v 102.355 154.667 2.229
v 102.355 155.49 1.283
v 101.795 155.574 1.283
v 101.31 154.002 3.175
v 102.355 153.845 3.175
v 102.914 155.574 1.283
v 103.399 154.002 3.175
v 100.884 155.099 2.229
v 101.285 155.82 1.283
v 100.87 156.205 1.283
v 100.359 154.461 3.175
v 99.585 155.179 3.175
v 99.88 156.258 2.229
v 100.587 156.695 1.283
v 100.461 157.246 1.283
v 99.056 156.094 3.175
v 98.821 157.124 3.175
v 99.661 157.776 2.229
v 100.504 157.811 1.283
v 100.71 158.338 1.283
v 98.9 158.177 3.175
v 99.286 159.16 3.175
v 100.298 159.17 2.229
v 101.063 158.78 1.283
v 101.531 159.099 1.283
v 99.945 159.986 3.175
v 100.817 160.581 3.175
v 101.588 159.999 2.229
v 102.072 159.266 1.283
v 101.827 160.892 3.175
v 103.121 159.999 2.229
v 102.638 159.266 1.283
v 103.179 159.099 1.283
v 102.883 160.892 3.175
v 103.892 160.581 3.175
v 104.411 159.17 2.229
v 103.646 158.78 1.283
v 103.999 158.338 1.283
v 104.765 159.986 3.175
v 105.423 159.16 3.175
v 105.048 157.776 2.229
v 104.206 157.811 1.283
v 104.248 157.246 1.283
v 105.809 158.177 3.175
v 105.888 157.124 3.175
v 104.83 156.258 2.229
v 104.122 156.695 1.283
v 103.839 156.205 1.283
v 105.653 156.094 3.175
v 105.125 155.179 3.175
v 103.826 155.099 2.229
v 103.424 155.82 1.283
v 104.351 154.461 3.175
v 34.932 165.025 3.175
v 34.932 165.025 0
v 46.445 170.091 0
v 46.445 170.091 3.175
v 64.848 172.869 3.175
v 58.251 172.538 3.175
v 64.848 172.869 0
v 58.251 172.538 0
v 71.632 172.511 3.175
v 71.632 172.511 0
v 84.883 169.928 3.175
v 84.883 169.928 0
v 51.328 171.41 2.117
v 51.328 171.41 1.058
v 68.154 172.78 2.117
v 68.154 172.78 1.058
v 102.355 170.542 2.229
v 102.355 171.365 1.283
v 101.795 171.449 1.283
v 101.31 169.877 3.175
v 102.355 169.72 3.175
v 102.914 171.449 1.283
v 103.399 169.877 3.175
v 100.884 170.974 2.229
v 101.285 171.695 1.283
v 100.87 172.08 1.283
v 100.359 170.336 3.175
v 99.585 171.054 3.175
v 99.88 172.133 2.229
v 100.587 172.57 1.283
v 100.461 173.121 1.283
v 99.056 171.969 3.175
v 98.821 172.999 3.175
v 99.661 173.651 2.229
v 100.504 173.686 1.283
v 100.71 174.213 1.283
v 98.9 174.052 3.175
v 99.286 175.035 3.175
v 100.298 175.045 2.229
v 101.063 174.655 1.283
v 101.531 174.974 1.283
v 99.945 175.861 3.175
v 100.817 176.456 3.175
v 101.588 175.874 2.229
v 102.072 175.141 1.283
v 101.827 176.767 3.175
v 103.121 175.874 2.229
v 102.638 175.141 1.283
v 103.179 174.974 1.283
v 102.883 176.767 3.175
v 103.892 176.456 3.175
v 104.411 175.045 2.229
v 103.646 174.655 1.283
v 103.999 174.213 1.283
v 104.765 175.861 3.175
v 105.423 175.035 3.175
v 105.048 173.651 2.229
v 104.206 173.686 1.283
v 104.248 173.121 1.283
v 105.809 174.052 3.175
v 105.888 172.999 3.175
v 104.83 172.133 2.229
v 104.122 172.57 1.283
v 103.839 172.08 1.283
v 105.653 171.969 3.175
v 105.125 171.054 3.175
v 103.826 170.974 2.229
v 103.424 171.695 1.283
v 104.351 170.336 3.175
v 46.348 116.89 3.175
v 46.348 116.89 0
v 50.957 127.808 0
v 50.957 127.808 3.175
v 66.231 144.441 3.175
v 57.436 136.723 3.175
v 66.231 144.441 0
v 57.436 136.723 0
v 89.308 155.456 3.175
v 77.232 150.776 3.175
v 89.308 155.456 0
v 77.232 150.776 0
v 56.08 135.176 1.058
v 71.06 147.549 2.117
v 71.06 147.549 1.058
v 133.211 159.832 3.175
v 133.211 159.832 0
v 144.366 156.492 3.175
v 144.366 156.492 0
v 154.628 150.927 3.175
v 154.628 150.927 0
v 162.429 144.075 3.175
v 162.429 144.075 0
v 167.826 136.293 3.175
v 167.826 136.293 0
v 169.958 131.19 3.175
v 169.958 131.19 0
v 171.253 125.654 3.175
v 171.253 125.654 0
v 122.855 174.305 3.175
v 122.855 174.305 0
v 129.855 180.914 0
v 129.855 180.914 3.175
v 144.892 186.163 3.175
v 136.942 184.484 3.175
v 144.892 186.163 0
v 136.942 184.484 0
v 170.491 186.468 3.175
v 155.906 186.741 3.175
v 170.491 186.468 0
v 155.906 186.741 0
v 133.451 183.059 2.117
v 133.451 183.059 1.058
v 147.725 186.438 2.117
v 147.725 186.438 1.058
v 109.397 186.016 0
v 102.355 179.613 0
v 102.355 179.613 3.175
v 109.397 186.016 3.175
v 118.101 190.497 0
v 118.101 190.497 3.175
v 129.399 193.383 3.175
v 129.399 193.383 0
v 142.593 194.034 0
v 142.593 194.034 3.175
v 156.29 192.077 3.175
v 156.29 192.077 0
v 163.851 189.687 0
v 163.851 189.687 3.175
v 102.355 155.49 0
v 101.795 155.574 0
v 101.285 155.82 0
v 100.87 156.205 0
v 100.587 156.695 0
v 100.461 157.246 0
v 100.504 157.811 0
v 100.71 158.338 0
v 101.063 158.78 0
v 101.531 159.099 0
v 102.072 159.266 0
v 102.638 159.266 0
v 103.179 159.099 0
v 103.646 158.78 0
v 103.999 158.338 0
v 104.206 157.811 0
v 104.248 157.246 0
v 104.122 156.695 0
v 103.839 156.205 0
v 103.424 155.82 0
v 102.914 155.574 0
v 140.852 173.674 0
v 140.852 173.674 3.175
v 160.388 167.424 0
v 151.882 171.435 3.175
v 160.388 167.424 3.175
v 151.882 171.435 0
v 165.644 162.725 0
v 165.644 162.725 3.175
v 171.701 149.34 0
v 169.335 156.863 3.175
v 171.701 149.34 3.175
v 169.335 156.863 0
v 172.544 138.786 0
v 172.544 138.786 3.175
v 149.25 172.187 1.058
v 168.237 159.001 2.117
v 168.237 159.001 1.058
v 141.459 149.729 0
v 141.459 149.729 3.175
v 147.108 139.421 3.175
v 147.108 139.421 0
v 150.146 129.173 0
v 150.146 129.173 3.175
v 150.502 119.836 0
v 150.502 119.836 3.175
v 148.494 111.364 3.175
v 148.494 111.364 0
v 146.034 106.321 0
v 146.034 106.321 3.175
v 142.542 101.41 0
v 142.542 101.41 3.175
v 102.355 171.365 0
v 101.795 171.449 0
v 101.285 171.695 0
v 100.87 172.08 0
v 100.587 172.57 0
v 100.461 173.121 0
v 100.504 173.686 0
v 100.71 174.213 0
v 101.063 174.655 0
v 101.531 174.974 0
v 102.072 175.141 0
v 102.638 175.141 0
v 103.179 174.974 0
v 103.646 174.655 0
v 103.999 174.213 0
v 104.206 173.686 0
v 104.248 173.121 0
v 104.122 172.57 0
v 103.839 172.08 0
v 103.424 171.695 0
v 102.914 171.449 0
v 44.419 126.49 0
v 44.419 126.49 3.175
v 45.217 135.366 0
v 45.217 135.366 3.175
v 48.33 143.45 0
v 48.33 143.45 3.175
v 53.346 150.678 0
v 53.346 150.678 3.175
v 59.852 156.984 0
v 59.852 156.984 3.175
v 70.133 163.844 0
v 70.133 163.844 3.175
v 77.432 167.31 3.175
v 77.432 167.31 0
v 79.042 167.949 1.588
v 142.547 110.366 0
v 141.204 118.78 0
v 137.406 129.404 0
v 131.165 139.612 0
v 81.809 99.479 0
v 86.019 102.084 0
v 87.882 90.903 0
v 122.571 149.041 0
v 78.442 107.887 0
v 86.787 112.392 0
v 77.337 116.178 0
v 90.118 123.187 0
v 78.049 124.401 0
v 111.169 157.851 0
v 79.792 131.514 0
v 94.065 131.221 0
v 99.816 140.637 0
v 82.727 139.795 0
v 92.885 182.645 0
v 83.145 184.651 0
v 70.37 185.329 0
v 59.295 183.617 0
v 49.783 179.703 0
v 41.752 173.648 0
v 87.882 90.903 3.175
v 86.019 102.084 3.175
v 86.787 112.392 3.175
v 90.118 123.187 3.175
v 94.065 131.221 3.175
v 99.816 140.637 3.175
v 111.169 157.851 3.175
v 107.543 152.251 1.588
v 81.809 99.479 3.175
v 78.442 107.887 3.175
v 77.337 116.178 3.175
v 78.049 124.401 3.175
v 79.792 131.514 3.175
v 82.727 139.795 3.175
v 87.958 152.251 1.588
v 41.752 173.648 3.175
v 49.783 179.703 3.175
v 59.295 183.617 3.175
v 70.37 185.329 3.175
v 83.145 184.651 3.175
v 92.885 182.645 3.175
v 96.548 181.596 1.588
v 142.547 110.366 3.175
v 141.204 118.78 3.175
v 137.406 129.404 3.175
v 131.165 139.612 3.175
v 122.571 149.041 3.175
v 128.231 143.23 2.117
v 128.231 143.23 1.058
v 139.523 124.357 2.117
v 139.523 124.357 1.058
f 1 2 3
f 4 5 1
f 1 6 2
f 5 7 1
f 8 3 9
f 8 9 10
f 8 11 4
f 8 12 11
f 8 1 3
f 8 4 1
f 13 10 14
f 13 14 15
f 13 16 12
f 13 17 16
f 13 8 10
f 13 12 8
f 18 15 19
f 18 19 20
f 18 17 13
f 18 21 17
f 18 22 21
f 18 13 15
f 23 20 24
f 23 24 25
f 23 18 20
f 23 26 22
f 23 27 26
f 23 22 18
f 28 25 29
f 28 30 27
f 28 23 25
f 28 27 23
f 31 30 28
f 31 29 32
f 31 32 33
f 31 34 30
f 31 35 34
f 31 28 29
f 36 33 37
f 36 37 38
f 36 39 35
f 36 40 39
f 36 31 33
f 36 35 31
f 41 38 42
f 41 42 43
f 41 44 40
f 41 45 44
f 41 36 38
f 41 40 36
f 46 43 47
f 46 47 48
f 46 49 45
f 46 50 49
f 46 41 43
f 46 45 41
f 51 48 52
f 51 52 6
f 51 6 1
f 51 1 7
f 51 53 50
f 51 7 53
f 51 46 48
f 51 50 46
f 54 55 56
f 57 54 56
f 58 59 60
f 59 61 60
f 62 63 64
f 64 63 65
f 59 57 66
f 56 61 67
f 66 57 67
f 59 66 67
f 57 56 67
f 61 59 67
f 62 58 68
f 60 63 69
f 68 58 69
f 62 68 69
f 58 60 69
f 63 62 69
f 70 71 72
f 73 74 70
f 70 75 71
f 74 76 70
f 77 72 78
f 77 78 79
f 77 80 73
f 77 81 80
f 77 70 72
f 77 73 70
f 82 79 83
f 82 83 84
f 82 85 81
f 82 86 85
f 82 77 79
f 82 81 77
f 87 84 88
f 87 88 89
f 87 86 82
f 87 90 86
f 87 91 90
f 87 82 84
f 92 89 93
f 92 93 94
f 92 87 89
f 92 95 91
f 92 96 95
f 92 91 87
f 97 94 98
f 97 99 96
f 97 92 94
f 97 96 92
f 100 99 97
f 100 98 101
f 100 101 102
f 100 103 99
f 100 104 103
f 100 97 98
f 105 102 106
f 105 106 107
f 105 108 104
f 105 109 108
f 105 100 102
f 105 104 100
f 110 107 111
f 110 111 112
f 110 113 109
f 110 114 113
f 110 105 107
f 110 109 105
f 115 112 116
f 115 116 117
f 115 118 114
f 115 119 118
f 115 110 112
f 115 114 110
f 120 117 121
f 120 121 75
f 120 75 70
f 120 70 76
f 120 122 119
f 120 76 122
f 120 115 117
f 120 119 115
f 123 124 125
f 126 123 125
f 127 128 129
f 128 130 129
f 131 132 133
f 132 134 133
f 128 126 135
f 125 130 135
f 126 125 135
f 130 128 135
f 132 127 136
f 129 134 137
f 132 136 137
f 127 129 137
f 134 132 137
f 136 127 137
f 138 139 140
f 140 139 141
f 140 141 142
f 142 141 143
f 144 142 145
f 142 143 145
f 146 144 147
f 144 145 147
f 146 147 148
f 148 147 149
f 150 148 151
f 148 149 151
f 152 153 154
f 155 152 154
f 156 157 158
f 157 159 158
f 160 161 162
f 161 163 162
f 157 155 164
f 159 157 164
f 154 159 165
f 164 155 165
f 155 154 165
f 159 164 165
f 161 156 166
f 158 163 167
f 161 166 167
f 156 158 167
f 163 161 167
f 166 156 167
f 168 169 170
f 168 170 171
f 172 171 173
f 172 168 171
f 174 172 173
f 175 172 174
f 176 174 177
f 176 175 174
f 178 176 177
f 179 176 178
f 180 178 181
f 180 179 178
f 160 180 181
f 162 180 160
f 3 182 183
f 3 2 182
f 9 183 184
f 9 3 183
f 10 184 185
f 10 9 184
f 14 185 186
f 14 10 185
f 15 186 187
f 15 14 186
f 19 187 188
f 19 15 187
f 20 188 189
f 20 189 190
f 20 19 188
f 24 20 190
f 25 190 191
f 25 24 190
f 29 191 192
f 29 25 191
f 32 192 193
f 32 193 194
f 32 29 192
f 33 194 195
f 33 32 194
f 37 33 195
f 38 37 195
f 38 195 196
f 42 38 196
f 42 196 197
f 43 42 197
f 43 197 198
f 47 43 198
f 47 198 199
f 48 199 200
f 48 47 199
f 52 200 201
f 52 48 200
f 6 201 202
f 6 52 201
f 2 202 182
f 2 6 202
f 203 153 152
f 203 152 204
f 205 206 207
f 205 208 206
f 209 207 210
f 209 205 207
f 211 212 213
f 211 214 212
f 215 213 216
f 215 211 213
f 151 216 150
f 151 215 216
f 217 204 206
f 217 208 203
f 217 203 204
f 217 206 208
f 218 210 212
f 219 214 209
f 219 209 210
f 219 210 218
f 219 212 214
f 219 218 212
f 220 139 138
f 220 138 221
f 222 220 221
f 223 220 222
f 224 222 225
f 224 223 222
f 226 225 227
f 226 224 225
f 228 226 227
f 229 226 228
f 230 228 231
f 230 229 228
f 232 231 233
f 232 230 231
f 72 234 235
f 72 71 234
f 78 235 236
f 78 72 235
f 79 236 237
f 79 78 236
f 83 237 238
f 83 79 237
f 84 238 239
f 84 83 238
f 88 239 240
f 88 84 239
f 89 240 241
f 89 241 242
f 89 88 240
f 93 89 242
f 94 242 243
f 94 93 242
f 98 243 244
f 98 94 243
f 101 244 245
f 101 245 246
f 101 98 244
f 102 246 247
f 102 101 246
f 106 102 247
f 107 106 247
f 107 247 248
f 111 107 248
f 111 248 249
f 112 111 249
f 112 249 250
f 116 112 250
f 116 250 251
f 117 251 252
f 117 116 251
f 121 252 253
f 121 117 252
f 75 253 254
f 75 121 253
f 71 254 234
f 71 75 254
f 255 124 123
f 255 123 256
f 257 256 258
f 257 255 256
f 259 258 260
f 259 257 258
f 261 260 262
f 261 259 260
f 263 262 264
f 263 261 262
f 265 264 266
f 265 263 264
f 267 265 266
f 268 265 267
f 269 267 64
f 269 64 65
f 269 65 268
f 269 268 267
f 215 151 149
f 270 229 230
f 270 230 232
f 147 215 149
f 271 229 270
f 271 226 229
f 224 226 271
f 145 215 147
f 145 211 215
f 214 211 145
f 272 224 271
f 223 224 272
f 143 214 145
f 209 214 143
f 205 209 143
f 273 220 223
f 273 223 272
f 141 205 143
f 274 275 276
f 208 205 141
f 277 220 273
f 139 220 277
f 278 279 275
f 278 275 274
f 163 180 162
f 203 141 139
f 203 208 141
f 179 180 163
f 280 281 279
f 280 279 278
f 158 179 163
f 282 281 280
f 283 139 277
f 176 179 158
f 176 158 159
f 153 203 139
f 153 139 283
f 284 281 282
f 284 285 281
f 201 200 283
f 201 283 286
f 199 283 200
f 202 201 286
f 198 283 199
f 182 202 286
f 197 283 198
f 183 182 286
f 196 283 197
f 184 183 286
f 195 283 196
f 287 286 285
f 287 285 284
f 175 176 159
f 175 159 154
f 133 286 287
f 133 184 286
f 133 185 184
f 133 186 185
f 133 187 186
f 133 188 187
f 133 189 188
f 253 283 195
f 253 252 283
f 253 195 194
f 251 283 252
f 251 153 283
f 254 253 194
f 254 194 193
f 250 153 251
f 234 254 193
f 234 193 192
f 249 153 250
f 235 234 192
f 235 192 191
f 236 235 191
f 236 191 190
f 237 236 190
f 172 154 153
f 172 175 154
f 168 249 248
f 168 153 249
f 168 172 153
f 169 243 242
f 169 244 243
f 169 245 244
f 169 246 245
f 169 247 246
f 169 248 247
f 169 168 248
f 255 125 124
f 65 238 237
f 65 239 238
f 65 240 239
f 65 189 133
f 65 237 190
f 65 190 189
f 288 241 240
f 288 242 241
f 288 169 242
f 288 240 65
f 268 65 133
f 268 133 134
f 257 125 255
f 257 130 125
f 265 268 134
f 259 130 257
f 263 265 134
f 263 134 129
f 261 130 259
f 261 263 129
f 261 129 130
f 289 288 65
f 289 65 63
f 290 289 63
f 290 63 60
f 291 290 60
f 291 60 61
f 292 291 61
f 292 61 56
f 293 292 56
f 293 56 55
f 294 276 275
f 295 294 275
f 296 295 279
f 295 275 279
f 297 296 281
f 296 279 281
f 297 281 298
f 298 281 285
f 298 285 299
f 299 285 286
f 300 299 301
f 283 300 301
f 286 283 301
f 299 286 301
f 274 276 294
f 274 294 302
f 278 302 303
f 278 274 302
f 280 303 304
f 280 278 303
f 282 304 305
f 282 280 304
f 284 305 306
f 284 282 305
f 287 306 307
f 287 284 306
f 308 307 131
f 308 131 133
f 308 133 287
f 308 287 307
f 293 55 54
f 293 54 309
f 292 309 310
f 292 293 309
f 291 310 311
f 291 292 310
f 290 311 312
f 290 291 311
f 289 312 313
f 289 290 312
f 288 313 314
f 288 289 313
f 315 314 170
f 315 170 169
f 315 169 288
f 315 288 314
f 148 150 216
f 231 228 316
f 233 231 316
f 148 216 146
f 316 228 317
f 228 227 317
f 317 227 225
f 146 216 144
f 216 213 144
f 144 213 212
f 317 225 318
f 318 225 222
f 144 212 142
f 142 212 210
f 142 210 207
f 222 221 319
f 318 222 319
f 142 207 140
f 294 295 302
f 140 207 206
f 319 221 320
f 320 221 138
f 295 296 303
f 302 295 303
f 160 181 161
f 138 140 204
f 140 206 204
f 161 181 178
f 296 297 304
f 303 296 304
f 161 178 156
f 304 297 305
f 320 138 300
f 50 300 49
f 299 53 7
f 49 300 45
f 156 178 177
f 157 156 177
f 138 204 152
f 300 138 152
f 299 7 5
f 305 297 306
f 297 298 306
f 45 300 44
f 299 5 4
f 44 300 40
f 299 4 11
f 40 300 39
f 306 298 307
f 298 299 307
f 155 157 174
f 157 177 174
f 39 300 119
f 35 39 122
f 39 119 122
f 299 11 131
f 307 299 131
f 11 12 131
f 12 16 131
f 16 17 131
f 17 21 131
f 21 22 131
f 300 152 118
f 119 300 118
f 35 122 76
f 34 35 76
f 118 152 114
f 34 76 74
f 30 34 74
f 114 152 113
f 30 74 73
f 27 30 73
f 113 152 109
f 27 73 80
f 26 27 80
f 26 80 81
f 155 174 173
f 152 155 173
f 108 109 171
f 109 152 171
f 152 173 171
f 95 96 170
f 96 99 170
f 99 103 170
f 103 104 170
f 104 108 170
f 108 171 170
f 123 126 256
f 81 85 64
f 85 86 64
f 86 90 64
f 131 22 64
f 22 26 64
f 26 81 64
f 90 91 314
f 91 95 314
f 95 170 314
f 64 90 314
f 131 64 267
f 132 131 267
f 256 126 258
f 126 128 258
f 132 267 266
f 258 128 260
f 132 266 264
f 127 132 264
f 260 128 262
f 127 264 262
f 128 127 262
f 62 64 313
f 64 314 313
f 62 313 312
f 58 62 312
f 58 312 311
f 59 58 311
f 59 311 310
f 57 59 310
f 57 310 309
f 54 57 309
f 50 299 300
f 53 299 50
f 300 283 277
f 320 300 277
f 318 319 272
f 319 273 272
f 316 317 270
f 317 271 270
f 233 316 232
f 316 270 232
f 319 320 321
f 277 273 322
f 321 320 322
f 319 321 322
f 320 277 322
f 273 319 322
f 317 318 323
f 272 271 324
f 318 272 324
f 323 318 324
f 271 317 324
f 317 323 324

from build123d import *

# Parameters (mm, degrees)
BOSS_EXTRUDE1_DEPTH                           = 3.175
CSK_FOR_6_FLAT_HEAD_MACHINE_SCREW1_AT_2_COUNT = 2
CSK_FOR_6_FLAT_HEAD_MACHINE_SCREW1_AT_2_PITCH = 15.875


with BuildPart() as part:
    # Sketch1 → Boss-Extrude1 (new body)
    with BuildSketch(Plane.XY):
        with BuildLine():
            add(Edge.make_bspline(
                [(34.931884294, 165.025383652), (48.828055098, 187.719675837), (76.45444521, 188.520066825), (100.445839981, 180.332984416), (102.354778378, 179.613312562)],
                knots=[0, 0, 0, 0, 0.389677888, 0.423902211, 0.423902211, 0.423902211, 0.423902211], degree=3))
            add(Edge.make_bspline(
                [(102.354778378, 179.613312562), (103.688252769, 181.188793447), (120.08516999, 197.822043176), (153.725104458, 196.423627733), (170.491254722, 186.467930029)],
                knots=[0.566670892, 0.566670892, 0.566670892, 0.566670892, 0.604773786, 1, 1, 1, 1], degree=3))
            add(Edge.make_bspline(
                [(122.854505464, 174.304585318), (133.217704907, 186.42088718), (141.87402844, 187.437840711), (170.491254722, 186.467930029)],
                knots=[0.652055608, 0.652055608, 0.652055608, 0.652055608, 1, 1, 1, 1], degree=3))
            add(Edge.make_bspline(
                [(122.854505464, 174.304585318), (150.100917529, 174.691970084), (179.076532886, 172.111025689), (171.253334777, 125.653941669)],
                knots=[0.582619189, 0.582619189, 0.582619189, 0.582619189, 1, 1, 1, 1], degree=3))
            add(Edge.make_bspline(
                [(133.211242061, 159.831846766), (133.979472702, 159.682774194), (151.701954736, 155.882016517), (168.618692728, 143.562281616), (171.253334777, 125.653941669)],
                knots=[0.658818977, 0.658818977, 0.658818977, 0.658818977, 0.673582965, 1, 1, 1, 1], degree=3))
            add(Edge.make_bspline(
                [(133.211242061, 159.831846766), (135.171104002, 157.821803299), (149.411618041, 141.491919338), (156.677266996, 118.334043551), (142.542206677, 101.410441691)],
                knots=[0.632989669, 0.632989669, 0.632989669, 0.632989669, 0.680758972, 1, 1, 1, 1], degree=3))
            add(Edge.make_bspline(
                [(111.168977908, 157.851131594), (130.281346763, 145.416554664), (144.493361512, 126.332685465), (142.542206677, 101.410441691)],
                knots=[0.543056126, 0.543056126, 0.543056126, 0.543056126, 1, 1, 1, 1], degree=3))
            add(Edge.make_bspline(
                [(87.881776799, 90.903091177), (80.744106998, 115.729737526), (96.501549834, 135.001149116), (109.967437477, 155.985823694), (111.168977908, 157.851131594)],
                knots=[0, 0, 0, 0, 0.464688532, 0.510268863, 0.510268863, 0.510268863, 0.510268863], degree=3))
            add(Edge.make_bspline(
                [(87.881776799, 90.903091177), (69.284973328, 112.208882094), (79.686924952, 132.536670793), (88.858930138, 154.386086423), (89.308499289, 155.455602419)],
                knots=[0, 0, 0, 0, 0.384997093, 0.404814032, 0.404814032, 0.404814032, 0.404814032], degree=3))
            add(Edge.make_bspline(
                [(46.348413822, 116.89002104), (52.796354346, 138.61615839), (70.085133937, 149.298268287), (89.308499289, 155.455602419)],
                knots=[0, 0, 0, 0, 0.378547614, 0.378547614, 0.378547614, 0.378547614], degree=3))
            add(Edge.make_bspline(
                [(46.348413822, 116.89002104), (37.891933448, 141.39657653), (59.918576266, 161.597817566), (82.928148168, 169.350328204), (84.88315803, 169.928160001)],
                knots=[0, 0, 0, 0, 0.348685432, 0.380913319, 0.380913319, 0.380913319, 0.380913319], degree=3))
            add(Edge.make_bspline(
                [(34.931884294, 165.025383652), (50.935408962, 174.180938827), (68.379973418, 174.627254849), (84.88315803, 169.928160001)],
                knots=[0, 0, 0, 0, 0.348652947, 0.348652947, 0.348652947, 0.348652947], degree=3))
        make_face()
    extrude(amount=BOSS_EXTRUDE1_DEPTH)

    # Sketch3 → CSK for #6 Flat Head Machine Screw1 (revolve, cut)
    with BuildSketch(Plane(origin=(102.354778378, 173.263312562, 3.175), x_dir=(0, -1, 0), z_dir=(1, 0, 0))):
        Polygon((0, 0), (0, 3.175), (1.89865, 3.175), (1.89865, 1.891953401), (3.5433, 0), align=None)
    csk_for_6_flat_head_machine_screw1 = revolve(axis=Axis((102.354778378, 173.263312562, 9.525), (0, 0, -1)), mode=Mode.SUBTRACT)

    # CSK for #6 Flat Head Machine Screw1 at 2: CSK for #6 Flat Head Machine Screw1 ×2
    with Locations(*[(0, -i * CSK_FOR_6_FLAT_HEAD_MACHINE_SCREW1_AT_2_PITCH, 0) for i in range(1, CSK_FOR_6_FLAT_HEAD_MACHINE_SCREW1_AT_2_COUNT)]):
        add(csk_for_6_flat_head_machine_screw1, mode=Mode.SUBTRACT)


solid = part.part
